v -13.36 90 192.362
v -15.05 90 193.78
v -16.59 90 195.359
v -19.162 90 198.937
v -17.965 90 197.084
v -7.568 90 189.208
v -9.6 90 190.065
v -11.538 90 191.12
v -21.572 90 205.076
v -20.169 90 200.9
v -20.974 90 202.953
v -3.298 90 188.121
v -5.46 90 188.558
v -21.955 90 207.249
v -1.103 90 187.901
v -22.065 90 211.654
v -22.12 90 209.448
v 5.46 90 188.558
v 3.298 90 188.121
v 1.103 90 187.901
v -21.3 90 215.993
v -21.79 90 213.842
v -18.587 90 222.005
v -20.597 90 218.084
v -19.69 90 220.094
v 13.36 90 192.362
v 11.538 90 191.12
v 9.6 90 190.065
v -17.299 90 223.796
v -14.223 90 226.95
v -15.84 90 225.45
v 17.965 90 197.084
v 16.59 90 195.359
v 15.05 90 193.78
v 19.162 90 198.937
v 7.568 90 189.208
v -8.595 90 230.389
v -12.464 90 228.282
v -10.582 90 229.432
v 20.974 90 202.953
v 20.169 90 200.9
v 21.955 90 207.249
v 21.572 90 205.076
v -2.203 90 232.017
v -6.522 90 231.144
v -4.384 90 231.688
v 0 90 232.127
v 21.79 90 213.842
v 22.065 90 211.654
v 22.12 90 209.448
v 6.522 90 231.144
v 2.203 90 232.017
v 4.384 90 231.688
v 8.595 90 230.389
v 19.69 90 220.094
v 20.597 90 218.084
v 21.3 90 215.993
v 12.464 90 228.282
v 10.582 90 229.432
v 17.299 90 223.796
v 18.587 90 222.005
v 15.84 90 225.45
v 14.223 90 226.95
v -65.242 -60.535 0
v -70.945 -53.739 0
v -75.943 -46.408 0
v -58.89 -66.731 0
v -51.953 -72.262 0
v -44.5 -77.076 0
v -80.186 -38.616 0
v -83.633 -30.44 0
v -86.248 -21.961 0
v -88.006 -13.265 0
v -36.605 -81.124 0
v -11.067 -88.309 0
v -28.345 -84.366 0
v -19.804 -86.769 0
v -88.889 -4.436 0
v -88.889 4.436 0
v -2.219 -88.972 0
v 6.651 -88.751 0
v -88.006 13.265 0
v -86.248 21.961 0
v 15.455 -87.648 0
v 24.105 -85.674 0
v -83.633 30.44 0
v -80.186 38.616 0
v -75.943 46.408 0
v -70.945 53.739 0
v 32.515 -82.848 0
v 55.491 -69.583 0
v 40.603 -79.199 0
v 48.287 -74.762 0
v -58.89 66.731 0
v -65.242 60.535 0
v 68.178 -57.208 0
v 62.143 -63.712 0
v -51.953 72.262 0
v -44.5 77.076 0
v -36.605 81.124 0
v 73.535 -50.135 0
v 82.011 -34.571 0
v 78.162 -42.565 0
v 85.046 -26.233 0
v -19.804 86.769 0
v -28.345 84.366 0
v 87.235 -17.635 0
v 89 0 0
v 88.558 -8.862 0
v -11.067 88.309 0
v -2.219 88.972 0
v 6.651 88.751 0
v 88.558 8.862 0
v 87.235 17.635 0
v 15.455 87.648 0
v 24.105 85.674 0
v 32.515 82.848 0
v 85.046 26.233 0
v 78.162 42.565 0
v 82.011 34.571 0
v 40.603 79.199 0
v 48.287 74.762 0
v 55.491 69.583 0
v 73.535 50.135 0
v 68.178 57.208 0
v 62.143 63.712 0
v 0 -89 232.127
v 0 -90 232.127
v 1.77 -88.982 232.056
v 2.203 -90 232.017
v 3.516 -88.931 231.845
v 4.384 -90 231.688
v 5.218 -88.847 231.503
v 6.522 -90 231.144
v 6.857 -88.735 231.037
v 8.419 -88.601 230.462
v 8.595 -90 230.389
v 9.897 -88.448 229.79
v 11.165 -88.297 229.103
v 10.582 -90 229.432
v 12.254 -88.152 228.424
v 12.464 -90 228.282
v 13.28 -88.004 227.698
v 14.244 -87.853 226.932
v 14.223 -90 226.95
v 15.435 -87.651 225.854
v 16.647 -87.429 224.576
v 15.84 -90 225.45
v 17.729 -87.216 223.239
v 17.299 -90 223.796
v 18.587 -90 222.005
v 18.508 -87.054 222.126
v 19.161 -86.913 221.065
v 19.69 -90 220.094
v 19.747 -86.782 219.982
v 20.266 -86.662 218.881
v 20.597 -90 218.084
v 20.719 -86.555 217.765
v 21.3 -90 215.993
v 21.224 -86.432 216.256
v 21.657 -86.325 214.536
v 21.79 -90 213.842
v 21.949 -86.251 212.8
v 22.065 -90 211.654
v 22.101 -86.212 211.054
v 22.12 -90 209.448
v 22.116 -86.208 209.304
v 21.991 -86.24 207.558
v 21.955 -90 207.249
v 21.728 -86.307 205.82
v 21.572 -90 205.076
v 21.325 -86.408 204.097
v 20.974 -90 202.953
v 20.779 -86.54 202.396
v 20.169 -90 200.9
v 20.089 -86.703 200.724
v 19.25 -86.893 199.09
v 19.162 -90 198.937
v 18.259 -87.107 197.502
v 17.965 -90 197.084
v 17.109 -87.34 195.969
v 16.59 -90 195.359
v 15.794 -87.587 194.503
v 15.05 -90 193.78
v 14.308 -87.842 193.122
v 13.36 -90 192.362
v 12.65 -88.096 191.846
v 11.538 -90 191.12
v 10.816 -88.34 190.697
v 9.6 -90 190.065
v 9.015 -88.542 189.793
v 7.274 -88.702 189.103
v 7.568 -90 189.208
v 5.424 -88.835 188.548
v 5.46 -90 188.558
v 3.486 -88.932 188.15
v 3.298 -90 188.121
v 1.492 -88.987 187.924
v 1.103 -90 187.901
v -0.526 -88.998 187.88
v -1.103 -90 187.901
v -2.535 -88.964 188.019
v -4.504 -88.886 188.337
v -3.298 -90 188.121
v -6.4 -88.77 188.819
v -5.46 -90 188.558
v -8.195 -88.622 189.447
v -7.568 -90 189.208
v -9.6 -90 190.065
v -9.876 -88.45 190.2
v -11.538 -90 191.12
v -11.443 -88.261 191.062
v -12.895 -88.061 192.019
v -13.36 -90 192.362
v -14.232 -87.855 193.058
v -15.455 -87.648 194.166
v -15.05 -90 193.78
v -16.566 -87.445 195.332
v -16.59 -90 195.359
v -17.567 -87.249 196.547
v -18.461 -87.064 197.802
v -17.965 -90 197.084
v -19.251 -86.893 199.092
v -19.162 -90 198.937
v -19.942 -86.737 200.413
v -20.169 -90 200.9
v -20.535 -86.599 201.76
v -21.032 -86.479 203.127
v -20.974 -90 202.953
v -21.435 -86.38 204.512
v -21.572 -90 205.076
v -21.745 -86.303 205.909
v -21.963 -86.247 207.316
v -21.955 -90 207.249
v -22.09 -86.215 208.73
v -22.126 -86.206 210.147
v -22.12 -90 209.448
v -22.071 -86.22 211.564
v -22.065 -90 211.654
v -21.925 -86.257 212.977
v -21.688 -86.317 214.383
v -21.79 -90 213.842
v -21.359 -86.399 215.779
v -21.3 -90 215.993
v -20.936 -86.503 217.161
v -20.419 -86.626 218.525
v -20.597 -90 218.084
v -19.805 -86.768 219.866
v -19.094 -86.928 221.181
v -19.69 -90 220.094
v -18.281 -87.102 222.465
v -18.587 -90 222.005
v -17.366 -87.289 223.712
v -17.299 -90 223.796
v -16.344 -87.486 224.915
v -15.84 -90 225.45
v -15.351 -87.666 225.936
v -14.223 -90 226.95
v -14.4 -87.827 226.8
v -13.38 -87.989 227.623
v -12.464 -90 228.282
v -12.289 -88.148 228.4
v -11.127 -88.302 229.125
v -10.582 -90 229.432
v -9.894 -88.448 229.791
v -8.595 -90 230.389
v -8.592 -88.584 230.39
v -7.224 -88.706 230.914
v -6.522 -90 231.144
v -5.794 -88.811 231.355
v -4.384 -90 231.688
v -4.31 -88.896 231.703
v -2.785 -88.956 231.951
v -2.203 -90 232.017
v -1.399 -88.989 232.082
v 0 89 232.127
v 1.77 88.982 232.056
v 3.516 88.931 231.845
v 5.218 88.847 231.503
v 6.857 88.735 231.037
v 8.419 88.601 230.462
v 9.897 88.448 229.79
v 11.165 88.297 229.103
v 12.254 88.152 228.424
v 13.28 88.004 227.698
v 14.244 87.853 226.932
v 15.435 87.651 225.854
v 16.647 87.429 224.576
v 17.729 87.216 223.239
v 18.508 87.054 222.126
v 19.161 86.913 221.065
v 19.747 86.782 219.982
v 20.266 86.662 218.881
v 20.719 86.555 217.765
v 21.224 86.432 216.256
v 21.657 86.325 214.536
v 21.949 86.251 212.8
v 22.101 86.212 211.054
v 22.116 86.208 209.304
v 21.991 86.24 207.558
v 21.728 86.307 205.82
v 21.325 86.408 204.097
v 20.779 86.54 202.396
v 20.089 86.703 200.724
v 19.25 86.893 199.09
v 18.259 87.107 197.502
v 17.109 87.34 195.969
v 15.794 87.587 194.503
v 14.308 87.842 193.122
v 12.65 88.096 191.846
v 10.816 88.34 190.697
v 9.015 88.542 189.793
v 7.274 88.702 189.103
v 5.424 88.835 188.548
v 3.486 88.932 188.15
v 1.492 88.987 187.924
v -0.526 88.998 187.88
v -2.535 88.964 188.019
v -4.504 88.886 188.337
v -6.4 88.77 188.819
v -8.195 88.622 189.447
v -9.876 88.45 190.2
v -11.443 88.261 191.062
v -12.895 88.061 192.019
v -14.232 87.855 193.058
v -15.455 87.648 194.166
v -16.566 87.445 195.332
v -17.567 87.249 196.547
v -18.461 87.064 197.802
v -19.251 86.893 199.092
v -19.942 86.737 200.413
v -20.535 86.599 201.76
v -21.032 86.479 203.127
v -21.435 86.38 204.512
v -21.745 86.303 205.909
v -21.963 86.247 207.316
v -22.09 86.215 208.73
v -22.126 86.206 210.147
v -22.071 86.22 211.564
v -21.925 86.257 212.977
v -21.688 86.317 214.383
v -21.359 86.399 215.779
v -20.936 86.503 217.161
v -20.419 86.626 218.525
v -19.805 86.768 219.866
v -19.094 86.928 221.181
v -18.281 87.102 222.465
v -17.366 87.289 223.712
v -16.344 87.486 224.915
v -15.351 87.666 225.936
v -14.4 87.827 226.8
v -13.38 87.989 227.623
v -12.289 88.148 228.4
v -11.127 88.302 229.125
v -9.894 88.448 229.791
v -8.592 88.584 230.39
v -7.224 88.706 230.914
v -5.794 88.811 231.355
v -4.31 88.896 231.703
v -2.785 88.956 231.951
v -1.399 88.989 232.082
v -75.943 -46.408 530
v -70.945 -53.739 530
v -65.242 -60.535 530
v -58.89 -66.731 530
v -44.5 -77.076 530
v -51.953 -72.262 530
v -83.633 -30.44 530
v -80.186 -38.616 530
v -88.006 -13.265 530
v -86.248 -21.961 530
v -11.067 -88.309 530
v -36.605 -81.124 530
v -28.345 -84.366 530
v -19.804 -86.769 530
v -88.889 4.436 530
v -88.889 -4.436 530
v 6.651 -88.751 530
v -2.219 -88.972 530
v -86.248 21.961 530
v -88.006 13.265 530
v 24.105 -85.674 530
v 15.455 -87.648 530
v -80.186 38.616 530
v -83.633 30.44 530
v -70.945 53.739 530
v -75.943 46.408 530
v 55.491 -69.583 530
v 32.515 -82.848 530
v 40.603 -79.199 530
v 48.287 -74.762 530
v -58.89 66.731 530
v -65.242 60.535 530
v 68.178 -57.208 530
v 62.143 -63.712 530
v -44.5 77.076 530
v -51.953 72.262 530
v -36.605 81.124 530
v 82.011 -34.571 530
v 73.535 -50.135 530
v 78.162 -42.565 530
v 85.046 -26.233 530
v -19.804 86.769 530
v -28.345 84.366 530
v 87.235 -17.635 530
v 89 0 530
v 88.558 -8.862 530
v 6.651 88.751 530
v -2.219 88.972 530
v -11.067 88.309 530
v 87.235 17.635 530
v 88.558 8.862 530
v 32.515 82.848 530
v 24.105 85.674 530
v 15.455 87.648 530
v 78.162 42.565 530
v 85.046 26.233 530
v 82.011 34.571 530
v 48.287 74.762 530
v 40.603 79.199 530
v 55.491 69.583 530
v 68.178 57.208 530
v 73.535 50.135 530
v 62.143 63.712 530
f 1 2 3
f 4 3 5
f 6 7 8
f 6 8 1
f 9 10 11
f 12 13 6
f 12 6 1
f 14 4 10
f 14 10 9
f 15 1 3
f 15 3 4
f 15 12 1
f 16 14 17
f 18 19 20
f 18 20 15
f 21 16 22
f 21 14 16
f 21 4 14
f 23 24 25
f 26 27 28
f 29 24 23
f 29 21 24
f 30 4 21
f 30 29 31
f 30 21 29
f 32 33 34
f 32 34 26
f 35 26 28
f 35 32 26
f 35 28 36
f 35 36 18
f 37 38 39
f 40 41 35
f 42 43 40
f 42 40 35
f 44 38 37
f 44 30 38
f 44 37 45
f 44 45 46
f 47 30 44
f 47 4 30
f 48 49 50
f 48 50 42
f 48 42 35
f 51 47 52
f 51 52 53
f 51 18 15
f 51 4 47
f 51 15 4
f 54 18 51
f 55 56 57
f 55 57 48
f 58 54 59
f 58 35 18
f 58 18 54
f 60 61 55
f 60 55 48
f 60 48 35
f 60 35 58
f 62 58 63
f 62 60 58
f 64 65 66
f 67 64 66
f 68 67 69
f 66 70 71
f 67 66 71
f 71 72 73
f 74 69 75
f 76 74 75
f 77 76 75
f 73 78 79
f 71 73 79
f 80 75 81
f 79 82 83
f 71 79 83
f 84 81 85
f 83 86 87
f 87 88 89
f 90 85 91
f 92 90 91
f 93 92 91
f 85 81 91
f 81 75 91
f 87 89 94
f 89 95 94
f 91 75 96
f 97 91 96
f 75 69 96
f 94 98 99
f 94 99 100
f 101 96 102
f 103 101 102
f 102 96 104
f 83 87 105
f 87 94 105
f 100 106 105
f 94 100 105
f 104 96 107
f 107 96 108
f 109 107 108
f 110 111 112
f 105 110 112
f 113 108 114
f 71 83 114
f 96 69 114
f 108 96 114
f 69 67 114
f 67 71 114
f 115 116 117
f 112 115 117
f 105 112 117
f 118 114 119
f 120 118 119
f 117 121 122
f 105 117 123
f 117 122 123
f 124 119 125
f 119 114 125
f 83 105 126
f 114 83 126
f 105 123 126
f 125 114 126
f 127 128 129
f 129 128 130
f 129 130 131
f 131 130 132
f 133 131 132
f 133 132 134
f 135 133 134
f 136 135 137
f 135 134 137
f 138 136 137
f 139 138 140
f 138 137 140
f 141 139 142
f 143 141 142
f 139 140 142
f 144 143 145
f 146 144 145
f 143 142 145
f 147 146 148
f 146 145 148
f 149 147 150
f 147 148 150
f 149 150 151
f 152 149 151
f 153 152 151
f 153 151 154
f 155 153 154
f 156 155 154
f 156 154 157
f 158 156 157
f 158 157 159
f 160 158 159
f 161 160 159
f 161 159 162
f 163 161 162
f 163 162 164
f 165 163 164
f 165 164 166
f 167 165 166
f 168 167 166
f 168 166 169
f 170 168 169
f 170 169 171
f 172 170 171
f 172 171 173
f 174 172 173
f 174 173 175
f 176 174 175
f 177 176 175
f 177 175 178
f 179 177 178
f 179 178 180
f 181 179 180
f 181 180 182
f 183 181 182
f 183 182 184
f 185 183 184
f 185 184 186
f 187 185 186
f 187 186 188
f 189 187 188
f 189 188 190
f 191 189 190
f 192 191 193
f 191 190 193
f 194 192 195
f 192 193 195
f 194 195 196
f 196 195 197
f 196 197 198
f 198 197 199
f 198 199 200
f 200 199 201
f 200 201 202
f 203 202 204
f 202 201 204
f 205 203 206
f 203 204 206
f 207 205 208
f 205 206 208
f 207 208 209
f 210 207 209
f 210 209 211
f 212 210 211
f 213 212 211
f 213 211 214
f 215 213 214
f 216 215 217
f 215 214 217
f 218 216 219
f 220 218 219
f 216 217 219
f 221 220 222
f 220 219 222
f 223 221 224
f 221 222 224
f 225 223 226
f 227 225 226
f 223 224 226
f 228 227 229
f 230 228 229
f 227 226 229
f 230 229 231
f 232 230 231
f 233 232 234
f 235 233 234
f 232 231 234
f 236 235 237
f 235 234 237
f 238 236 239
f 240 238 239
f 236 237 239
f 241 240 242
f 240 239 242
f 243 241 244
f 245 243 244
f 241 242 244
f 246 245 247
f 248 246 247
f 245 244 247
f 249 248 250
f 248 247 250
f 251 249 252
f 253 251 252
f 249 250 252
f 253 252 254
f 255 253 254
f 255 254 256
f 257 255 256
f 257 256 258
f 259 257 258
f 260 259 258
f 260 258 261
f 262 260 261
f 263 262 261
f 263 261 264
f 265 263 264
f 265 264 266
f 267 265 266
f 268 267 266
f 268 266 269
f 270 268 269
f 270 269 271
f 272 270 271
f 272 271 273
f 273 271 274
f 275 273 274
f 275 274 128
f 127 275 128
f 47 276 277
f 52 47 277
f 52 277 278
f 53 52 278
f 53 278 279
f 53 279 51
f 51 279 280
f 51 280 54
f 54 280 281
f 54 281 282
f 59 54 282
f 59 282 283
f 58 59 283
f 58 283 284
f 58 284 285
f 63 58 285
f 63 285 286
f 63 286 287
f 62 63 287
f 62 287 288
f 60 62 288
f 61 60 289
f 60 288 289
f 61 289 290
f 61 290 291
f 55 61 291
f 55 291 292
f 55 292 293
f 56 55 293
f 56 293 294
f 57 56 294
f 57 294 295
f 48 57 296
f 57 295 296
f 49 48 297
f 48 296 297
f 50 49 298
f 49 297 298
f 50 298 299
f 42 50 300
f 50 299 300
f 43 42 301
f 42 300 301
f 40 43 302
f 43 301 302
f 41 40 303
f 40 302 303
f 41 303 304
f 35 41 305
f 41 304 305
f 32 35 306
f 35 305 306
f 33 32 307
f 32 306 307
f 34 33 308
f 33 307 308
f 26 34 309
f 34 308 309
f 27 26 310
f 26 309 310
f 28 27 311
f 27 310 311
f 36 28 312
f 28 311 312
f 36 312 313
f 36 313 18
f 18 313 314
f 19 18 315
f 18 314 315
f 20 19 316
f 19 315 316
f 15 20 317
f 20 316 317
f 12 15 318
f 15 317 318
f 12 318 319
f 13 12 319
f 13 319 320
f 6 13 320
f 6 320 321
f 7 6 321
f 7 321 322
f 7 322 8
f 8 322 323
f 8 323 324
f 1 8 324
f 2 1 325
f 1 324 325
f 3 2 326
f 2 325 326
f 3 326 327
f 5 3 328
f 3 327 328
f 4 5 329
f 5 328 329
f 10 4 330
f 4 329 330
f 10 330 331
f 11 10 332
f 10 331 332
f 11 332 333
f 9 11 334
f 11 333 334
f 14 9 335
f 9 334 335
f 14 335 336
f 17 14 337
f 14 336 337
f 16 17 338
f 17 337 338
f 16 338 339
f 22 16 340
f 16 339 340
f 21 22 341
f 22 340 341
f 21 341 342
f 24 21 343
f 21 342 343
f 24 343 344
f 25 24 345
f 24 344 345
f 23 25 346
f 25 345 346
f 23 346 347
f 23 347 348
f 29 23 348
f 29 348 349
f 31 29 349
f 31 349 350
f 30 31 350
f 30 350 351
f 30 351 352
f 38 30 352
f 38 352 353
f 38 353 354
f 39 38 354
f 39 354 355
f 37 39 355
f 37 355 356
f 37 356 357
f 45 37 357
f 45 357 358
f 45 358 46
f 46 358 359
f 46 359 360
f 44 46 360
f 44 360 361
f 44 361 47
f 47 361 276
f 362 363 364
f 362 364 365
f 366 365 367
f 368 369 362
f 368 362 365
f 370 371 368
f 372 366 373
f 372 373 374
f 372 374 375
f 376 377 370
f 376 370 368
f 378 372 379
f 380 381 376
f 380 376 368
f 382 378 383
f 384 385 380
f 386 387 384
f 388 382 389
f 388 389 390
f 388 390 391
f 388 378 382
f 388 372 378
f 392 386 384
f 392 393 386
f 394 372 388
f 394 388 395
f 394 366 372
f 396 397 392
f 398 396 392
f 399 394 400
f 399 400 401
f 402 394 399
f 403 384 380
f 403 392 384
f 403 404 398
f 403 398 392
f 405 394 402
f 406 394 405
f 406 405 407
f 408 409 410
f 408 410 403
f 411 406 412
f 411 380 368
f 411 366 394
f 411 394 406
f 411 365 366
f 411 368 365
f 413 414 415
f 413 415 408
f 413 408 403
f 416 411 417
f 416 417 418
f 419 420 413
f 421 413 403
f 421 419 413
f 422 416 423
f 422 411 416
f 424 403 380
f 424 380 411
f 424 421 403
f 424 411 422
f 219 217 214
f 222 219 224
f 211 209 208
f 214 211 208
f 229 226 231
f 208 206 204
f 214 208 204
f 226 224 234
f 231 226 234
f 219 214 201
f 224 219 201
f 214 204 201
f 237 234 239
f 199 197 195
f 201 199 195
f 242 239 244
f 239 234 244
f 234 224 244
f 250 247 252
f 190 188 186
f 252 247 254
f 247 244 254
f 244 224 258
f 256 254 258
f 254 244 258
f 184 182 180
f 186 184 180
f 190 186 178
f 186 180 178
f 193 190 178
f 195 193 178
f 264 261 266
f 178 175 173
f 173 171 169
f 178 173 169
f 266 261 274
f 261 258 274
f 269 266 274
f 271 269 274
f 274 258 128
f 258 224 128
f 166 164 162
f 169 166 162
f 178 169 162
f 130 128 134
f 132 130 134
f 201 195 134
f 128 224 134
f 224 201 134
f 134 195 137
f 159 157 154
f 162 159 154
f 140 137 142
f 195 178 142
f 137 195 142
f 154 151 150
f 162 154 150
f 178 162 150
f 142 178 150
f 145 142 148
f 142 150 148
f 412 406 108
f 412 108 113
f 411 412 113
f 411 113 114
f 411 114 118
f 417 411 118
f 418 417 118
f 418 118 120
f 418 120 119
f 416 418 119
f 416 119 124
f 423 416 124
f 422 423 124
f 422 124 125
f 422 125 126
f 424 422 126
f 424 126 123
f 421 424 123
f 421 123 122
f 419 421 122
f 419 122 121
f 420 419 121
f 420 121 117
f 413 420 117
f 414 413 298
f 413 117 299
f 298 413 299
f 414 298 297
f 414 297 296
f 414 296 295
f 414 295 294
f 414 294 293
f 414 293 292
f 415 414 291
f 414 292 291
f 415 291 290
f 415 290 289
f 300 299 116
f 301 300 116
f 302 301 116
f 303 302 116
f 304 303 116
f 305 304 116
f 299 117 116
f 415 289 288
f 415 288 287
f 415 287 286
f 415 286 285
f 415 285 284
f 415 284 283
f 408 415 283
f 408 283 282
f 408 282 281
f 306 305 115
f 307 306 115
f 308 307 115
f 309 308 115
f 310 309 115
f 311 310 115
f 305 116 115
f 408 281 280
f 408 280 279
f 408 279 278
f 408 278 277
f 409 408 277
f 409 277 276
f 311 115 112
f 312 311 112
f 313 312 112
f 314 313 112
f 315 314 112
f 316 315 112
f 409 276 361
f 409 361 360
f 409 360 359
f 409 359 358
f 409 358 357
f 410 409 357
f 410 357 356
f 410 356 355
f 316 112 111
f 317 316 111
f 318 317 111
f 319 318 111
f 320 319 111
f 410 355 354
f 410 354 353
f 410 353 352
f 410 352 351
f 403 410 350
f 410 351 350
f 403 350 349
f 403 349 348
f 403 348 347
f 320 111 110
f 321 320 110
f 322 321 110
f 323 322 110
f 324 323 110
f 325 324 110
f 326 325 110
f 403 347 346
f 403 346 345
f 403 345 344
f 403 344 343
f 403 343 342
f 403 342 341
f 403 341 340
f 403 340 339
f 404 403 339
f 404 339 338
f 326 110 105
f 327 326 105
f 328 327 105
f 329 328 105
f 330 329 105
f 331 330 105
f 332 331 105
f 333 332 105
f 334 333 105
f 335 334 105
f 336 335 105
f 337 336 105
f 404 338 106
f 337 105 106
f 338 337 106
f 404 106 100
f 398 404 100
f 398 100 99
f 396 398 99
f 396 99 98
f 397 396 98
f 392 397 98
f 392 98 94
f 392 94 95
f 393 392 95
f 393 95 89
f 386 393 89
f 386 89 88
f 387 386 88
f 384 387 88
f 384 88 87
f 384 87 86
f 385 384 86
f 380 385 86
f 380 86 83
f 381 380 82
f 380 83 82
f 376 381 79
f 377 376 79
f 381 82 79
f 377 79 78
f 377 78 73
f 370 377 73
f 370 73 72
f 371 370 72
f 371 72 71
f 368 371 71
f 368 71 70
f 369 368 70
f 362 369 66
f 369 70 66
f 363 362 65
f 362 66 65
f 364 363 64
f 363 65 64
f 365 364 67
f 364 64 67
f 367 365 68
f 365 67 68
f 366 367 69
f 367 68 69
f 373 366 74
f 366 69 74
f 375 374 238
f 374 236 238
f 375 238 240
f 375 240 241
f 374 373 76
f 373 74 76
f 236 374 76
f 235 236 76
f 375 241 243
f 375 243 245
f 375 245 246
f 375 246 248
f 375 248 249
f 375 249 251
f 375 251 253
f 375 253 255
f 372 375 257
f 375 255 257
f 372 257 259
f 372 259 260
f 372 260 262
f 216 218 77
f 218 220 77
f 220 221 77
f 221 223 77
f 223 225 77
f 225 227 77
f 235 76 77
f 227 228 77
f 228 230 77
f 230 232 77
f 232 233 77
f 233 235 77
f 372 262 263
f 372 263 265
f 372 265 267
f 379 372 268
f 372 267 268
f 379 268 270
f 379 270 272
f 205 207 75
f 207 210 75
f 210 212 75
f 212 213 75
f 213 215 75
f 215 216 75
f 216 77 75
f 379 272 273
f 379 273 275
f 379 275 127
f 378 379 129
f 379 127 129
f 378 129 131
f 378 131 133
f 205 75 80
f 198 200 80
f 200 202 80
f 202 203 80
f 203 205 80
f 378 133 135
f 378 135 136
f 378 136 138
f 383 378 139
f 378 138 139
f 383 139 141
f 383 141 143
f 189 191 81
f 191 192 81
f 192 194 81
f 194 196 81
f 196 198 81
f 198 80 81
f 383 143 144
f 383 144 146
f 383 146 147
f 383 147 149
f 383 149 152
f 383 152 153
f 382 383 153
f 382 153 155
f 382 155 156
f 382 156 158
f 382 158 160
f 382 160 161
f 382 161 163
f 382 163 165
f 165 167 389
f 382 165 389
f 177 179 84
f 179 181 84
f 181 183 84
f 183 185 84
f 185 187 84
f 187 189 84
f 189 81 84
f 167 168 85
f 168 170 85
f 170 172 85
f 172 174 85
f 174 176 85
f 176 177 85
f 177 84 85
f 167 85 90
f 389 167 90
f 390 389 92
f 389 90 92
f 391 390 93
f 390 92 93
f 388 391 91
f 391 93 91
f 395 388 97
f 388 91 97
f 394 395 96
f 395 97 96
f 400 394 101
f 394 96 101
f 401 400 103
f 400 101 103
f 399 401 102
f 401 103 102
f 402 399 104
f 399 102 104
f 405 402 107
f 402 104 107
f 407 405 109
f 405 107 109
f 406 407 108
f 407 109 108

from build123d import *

# Parameters (mm, degrees)
SKIZZE1_R                            = 89
AUFSATZ_LINEAR_AUSTRAGEN1_DEPTH      = 530
AUFSATZ_LINEAR_AUSTRAGEN2_DEPTH      = 90
AUFSATZ_LINEAR_AUSTRAGEN2_DEPTH_BACK = 90
SKIZZE2_R                            = 22.126613263


with BuildPart() as part:
    # Skizze1 → Aufsatz-Linear austragen1 (new body)
    with BuildSketch(Plane.XY):
        Circle(SKIZZE1_R)
    extrude(amount=AUFSATZ_LINEAR_AUSTRAGEN1_DEPTH)

    # Skizze2 → Aufsatz-Linear austragen2 (add, two sides: drawn at the far end of the back side and taken through both)
    with BuildSketch(Plane(origin=(0, 0, 0), x_dir=(1, 0, 0), z_dir=(0, 1, 0)).offset(-AUFSATZ_LINEAR_AUSTRAGEN2_DEPTH_BACK)):
        with Locations((0, -210)):
            Circle(SKIZZE2_R)
    extrude(amount=AUFSATZ_LINEAR_AUSTRAGEN2_DEPTH + AUFSATZ_LINEAR_AUSTRAGEN2_DEPTH_BACK)


solid = part.part
